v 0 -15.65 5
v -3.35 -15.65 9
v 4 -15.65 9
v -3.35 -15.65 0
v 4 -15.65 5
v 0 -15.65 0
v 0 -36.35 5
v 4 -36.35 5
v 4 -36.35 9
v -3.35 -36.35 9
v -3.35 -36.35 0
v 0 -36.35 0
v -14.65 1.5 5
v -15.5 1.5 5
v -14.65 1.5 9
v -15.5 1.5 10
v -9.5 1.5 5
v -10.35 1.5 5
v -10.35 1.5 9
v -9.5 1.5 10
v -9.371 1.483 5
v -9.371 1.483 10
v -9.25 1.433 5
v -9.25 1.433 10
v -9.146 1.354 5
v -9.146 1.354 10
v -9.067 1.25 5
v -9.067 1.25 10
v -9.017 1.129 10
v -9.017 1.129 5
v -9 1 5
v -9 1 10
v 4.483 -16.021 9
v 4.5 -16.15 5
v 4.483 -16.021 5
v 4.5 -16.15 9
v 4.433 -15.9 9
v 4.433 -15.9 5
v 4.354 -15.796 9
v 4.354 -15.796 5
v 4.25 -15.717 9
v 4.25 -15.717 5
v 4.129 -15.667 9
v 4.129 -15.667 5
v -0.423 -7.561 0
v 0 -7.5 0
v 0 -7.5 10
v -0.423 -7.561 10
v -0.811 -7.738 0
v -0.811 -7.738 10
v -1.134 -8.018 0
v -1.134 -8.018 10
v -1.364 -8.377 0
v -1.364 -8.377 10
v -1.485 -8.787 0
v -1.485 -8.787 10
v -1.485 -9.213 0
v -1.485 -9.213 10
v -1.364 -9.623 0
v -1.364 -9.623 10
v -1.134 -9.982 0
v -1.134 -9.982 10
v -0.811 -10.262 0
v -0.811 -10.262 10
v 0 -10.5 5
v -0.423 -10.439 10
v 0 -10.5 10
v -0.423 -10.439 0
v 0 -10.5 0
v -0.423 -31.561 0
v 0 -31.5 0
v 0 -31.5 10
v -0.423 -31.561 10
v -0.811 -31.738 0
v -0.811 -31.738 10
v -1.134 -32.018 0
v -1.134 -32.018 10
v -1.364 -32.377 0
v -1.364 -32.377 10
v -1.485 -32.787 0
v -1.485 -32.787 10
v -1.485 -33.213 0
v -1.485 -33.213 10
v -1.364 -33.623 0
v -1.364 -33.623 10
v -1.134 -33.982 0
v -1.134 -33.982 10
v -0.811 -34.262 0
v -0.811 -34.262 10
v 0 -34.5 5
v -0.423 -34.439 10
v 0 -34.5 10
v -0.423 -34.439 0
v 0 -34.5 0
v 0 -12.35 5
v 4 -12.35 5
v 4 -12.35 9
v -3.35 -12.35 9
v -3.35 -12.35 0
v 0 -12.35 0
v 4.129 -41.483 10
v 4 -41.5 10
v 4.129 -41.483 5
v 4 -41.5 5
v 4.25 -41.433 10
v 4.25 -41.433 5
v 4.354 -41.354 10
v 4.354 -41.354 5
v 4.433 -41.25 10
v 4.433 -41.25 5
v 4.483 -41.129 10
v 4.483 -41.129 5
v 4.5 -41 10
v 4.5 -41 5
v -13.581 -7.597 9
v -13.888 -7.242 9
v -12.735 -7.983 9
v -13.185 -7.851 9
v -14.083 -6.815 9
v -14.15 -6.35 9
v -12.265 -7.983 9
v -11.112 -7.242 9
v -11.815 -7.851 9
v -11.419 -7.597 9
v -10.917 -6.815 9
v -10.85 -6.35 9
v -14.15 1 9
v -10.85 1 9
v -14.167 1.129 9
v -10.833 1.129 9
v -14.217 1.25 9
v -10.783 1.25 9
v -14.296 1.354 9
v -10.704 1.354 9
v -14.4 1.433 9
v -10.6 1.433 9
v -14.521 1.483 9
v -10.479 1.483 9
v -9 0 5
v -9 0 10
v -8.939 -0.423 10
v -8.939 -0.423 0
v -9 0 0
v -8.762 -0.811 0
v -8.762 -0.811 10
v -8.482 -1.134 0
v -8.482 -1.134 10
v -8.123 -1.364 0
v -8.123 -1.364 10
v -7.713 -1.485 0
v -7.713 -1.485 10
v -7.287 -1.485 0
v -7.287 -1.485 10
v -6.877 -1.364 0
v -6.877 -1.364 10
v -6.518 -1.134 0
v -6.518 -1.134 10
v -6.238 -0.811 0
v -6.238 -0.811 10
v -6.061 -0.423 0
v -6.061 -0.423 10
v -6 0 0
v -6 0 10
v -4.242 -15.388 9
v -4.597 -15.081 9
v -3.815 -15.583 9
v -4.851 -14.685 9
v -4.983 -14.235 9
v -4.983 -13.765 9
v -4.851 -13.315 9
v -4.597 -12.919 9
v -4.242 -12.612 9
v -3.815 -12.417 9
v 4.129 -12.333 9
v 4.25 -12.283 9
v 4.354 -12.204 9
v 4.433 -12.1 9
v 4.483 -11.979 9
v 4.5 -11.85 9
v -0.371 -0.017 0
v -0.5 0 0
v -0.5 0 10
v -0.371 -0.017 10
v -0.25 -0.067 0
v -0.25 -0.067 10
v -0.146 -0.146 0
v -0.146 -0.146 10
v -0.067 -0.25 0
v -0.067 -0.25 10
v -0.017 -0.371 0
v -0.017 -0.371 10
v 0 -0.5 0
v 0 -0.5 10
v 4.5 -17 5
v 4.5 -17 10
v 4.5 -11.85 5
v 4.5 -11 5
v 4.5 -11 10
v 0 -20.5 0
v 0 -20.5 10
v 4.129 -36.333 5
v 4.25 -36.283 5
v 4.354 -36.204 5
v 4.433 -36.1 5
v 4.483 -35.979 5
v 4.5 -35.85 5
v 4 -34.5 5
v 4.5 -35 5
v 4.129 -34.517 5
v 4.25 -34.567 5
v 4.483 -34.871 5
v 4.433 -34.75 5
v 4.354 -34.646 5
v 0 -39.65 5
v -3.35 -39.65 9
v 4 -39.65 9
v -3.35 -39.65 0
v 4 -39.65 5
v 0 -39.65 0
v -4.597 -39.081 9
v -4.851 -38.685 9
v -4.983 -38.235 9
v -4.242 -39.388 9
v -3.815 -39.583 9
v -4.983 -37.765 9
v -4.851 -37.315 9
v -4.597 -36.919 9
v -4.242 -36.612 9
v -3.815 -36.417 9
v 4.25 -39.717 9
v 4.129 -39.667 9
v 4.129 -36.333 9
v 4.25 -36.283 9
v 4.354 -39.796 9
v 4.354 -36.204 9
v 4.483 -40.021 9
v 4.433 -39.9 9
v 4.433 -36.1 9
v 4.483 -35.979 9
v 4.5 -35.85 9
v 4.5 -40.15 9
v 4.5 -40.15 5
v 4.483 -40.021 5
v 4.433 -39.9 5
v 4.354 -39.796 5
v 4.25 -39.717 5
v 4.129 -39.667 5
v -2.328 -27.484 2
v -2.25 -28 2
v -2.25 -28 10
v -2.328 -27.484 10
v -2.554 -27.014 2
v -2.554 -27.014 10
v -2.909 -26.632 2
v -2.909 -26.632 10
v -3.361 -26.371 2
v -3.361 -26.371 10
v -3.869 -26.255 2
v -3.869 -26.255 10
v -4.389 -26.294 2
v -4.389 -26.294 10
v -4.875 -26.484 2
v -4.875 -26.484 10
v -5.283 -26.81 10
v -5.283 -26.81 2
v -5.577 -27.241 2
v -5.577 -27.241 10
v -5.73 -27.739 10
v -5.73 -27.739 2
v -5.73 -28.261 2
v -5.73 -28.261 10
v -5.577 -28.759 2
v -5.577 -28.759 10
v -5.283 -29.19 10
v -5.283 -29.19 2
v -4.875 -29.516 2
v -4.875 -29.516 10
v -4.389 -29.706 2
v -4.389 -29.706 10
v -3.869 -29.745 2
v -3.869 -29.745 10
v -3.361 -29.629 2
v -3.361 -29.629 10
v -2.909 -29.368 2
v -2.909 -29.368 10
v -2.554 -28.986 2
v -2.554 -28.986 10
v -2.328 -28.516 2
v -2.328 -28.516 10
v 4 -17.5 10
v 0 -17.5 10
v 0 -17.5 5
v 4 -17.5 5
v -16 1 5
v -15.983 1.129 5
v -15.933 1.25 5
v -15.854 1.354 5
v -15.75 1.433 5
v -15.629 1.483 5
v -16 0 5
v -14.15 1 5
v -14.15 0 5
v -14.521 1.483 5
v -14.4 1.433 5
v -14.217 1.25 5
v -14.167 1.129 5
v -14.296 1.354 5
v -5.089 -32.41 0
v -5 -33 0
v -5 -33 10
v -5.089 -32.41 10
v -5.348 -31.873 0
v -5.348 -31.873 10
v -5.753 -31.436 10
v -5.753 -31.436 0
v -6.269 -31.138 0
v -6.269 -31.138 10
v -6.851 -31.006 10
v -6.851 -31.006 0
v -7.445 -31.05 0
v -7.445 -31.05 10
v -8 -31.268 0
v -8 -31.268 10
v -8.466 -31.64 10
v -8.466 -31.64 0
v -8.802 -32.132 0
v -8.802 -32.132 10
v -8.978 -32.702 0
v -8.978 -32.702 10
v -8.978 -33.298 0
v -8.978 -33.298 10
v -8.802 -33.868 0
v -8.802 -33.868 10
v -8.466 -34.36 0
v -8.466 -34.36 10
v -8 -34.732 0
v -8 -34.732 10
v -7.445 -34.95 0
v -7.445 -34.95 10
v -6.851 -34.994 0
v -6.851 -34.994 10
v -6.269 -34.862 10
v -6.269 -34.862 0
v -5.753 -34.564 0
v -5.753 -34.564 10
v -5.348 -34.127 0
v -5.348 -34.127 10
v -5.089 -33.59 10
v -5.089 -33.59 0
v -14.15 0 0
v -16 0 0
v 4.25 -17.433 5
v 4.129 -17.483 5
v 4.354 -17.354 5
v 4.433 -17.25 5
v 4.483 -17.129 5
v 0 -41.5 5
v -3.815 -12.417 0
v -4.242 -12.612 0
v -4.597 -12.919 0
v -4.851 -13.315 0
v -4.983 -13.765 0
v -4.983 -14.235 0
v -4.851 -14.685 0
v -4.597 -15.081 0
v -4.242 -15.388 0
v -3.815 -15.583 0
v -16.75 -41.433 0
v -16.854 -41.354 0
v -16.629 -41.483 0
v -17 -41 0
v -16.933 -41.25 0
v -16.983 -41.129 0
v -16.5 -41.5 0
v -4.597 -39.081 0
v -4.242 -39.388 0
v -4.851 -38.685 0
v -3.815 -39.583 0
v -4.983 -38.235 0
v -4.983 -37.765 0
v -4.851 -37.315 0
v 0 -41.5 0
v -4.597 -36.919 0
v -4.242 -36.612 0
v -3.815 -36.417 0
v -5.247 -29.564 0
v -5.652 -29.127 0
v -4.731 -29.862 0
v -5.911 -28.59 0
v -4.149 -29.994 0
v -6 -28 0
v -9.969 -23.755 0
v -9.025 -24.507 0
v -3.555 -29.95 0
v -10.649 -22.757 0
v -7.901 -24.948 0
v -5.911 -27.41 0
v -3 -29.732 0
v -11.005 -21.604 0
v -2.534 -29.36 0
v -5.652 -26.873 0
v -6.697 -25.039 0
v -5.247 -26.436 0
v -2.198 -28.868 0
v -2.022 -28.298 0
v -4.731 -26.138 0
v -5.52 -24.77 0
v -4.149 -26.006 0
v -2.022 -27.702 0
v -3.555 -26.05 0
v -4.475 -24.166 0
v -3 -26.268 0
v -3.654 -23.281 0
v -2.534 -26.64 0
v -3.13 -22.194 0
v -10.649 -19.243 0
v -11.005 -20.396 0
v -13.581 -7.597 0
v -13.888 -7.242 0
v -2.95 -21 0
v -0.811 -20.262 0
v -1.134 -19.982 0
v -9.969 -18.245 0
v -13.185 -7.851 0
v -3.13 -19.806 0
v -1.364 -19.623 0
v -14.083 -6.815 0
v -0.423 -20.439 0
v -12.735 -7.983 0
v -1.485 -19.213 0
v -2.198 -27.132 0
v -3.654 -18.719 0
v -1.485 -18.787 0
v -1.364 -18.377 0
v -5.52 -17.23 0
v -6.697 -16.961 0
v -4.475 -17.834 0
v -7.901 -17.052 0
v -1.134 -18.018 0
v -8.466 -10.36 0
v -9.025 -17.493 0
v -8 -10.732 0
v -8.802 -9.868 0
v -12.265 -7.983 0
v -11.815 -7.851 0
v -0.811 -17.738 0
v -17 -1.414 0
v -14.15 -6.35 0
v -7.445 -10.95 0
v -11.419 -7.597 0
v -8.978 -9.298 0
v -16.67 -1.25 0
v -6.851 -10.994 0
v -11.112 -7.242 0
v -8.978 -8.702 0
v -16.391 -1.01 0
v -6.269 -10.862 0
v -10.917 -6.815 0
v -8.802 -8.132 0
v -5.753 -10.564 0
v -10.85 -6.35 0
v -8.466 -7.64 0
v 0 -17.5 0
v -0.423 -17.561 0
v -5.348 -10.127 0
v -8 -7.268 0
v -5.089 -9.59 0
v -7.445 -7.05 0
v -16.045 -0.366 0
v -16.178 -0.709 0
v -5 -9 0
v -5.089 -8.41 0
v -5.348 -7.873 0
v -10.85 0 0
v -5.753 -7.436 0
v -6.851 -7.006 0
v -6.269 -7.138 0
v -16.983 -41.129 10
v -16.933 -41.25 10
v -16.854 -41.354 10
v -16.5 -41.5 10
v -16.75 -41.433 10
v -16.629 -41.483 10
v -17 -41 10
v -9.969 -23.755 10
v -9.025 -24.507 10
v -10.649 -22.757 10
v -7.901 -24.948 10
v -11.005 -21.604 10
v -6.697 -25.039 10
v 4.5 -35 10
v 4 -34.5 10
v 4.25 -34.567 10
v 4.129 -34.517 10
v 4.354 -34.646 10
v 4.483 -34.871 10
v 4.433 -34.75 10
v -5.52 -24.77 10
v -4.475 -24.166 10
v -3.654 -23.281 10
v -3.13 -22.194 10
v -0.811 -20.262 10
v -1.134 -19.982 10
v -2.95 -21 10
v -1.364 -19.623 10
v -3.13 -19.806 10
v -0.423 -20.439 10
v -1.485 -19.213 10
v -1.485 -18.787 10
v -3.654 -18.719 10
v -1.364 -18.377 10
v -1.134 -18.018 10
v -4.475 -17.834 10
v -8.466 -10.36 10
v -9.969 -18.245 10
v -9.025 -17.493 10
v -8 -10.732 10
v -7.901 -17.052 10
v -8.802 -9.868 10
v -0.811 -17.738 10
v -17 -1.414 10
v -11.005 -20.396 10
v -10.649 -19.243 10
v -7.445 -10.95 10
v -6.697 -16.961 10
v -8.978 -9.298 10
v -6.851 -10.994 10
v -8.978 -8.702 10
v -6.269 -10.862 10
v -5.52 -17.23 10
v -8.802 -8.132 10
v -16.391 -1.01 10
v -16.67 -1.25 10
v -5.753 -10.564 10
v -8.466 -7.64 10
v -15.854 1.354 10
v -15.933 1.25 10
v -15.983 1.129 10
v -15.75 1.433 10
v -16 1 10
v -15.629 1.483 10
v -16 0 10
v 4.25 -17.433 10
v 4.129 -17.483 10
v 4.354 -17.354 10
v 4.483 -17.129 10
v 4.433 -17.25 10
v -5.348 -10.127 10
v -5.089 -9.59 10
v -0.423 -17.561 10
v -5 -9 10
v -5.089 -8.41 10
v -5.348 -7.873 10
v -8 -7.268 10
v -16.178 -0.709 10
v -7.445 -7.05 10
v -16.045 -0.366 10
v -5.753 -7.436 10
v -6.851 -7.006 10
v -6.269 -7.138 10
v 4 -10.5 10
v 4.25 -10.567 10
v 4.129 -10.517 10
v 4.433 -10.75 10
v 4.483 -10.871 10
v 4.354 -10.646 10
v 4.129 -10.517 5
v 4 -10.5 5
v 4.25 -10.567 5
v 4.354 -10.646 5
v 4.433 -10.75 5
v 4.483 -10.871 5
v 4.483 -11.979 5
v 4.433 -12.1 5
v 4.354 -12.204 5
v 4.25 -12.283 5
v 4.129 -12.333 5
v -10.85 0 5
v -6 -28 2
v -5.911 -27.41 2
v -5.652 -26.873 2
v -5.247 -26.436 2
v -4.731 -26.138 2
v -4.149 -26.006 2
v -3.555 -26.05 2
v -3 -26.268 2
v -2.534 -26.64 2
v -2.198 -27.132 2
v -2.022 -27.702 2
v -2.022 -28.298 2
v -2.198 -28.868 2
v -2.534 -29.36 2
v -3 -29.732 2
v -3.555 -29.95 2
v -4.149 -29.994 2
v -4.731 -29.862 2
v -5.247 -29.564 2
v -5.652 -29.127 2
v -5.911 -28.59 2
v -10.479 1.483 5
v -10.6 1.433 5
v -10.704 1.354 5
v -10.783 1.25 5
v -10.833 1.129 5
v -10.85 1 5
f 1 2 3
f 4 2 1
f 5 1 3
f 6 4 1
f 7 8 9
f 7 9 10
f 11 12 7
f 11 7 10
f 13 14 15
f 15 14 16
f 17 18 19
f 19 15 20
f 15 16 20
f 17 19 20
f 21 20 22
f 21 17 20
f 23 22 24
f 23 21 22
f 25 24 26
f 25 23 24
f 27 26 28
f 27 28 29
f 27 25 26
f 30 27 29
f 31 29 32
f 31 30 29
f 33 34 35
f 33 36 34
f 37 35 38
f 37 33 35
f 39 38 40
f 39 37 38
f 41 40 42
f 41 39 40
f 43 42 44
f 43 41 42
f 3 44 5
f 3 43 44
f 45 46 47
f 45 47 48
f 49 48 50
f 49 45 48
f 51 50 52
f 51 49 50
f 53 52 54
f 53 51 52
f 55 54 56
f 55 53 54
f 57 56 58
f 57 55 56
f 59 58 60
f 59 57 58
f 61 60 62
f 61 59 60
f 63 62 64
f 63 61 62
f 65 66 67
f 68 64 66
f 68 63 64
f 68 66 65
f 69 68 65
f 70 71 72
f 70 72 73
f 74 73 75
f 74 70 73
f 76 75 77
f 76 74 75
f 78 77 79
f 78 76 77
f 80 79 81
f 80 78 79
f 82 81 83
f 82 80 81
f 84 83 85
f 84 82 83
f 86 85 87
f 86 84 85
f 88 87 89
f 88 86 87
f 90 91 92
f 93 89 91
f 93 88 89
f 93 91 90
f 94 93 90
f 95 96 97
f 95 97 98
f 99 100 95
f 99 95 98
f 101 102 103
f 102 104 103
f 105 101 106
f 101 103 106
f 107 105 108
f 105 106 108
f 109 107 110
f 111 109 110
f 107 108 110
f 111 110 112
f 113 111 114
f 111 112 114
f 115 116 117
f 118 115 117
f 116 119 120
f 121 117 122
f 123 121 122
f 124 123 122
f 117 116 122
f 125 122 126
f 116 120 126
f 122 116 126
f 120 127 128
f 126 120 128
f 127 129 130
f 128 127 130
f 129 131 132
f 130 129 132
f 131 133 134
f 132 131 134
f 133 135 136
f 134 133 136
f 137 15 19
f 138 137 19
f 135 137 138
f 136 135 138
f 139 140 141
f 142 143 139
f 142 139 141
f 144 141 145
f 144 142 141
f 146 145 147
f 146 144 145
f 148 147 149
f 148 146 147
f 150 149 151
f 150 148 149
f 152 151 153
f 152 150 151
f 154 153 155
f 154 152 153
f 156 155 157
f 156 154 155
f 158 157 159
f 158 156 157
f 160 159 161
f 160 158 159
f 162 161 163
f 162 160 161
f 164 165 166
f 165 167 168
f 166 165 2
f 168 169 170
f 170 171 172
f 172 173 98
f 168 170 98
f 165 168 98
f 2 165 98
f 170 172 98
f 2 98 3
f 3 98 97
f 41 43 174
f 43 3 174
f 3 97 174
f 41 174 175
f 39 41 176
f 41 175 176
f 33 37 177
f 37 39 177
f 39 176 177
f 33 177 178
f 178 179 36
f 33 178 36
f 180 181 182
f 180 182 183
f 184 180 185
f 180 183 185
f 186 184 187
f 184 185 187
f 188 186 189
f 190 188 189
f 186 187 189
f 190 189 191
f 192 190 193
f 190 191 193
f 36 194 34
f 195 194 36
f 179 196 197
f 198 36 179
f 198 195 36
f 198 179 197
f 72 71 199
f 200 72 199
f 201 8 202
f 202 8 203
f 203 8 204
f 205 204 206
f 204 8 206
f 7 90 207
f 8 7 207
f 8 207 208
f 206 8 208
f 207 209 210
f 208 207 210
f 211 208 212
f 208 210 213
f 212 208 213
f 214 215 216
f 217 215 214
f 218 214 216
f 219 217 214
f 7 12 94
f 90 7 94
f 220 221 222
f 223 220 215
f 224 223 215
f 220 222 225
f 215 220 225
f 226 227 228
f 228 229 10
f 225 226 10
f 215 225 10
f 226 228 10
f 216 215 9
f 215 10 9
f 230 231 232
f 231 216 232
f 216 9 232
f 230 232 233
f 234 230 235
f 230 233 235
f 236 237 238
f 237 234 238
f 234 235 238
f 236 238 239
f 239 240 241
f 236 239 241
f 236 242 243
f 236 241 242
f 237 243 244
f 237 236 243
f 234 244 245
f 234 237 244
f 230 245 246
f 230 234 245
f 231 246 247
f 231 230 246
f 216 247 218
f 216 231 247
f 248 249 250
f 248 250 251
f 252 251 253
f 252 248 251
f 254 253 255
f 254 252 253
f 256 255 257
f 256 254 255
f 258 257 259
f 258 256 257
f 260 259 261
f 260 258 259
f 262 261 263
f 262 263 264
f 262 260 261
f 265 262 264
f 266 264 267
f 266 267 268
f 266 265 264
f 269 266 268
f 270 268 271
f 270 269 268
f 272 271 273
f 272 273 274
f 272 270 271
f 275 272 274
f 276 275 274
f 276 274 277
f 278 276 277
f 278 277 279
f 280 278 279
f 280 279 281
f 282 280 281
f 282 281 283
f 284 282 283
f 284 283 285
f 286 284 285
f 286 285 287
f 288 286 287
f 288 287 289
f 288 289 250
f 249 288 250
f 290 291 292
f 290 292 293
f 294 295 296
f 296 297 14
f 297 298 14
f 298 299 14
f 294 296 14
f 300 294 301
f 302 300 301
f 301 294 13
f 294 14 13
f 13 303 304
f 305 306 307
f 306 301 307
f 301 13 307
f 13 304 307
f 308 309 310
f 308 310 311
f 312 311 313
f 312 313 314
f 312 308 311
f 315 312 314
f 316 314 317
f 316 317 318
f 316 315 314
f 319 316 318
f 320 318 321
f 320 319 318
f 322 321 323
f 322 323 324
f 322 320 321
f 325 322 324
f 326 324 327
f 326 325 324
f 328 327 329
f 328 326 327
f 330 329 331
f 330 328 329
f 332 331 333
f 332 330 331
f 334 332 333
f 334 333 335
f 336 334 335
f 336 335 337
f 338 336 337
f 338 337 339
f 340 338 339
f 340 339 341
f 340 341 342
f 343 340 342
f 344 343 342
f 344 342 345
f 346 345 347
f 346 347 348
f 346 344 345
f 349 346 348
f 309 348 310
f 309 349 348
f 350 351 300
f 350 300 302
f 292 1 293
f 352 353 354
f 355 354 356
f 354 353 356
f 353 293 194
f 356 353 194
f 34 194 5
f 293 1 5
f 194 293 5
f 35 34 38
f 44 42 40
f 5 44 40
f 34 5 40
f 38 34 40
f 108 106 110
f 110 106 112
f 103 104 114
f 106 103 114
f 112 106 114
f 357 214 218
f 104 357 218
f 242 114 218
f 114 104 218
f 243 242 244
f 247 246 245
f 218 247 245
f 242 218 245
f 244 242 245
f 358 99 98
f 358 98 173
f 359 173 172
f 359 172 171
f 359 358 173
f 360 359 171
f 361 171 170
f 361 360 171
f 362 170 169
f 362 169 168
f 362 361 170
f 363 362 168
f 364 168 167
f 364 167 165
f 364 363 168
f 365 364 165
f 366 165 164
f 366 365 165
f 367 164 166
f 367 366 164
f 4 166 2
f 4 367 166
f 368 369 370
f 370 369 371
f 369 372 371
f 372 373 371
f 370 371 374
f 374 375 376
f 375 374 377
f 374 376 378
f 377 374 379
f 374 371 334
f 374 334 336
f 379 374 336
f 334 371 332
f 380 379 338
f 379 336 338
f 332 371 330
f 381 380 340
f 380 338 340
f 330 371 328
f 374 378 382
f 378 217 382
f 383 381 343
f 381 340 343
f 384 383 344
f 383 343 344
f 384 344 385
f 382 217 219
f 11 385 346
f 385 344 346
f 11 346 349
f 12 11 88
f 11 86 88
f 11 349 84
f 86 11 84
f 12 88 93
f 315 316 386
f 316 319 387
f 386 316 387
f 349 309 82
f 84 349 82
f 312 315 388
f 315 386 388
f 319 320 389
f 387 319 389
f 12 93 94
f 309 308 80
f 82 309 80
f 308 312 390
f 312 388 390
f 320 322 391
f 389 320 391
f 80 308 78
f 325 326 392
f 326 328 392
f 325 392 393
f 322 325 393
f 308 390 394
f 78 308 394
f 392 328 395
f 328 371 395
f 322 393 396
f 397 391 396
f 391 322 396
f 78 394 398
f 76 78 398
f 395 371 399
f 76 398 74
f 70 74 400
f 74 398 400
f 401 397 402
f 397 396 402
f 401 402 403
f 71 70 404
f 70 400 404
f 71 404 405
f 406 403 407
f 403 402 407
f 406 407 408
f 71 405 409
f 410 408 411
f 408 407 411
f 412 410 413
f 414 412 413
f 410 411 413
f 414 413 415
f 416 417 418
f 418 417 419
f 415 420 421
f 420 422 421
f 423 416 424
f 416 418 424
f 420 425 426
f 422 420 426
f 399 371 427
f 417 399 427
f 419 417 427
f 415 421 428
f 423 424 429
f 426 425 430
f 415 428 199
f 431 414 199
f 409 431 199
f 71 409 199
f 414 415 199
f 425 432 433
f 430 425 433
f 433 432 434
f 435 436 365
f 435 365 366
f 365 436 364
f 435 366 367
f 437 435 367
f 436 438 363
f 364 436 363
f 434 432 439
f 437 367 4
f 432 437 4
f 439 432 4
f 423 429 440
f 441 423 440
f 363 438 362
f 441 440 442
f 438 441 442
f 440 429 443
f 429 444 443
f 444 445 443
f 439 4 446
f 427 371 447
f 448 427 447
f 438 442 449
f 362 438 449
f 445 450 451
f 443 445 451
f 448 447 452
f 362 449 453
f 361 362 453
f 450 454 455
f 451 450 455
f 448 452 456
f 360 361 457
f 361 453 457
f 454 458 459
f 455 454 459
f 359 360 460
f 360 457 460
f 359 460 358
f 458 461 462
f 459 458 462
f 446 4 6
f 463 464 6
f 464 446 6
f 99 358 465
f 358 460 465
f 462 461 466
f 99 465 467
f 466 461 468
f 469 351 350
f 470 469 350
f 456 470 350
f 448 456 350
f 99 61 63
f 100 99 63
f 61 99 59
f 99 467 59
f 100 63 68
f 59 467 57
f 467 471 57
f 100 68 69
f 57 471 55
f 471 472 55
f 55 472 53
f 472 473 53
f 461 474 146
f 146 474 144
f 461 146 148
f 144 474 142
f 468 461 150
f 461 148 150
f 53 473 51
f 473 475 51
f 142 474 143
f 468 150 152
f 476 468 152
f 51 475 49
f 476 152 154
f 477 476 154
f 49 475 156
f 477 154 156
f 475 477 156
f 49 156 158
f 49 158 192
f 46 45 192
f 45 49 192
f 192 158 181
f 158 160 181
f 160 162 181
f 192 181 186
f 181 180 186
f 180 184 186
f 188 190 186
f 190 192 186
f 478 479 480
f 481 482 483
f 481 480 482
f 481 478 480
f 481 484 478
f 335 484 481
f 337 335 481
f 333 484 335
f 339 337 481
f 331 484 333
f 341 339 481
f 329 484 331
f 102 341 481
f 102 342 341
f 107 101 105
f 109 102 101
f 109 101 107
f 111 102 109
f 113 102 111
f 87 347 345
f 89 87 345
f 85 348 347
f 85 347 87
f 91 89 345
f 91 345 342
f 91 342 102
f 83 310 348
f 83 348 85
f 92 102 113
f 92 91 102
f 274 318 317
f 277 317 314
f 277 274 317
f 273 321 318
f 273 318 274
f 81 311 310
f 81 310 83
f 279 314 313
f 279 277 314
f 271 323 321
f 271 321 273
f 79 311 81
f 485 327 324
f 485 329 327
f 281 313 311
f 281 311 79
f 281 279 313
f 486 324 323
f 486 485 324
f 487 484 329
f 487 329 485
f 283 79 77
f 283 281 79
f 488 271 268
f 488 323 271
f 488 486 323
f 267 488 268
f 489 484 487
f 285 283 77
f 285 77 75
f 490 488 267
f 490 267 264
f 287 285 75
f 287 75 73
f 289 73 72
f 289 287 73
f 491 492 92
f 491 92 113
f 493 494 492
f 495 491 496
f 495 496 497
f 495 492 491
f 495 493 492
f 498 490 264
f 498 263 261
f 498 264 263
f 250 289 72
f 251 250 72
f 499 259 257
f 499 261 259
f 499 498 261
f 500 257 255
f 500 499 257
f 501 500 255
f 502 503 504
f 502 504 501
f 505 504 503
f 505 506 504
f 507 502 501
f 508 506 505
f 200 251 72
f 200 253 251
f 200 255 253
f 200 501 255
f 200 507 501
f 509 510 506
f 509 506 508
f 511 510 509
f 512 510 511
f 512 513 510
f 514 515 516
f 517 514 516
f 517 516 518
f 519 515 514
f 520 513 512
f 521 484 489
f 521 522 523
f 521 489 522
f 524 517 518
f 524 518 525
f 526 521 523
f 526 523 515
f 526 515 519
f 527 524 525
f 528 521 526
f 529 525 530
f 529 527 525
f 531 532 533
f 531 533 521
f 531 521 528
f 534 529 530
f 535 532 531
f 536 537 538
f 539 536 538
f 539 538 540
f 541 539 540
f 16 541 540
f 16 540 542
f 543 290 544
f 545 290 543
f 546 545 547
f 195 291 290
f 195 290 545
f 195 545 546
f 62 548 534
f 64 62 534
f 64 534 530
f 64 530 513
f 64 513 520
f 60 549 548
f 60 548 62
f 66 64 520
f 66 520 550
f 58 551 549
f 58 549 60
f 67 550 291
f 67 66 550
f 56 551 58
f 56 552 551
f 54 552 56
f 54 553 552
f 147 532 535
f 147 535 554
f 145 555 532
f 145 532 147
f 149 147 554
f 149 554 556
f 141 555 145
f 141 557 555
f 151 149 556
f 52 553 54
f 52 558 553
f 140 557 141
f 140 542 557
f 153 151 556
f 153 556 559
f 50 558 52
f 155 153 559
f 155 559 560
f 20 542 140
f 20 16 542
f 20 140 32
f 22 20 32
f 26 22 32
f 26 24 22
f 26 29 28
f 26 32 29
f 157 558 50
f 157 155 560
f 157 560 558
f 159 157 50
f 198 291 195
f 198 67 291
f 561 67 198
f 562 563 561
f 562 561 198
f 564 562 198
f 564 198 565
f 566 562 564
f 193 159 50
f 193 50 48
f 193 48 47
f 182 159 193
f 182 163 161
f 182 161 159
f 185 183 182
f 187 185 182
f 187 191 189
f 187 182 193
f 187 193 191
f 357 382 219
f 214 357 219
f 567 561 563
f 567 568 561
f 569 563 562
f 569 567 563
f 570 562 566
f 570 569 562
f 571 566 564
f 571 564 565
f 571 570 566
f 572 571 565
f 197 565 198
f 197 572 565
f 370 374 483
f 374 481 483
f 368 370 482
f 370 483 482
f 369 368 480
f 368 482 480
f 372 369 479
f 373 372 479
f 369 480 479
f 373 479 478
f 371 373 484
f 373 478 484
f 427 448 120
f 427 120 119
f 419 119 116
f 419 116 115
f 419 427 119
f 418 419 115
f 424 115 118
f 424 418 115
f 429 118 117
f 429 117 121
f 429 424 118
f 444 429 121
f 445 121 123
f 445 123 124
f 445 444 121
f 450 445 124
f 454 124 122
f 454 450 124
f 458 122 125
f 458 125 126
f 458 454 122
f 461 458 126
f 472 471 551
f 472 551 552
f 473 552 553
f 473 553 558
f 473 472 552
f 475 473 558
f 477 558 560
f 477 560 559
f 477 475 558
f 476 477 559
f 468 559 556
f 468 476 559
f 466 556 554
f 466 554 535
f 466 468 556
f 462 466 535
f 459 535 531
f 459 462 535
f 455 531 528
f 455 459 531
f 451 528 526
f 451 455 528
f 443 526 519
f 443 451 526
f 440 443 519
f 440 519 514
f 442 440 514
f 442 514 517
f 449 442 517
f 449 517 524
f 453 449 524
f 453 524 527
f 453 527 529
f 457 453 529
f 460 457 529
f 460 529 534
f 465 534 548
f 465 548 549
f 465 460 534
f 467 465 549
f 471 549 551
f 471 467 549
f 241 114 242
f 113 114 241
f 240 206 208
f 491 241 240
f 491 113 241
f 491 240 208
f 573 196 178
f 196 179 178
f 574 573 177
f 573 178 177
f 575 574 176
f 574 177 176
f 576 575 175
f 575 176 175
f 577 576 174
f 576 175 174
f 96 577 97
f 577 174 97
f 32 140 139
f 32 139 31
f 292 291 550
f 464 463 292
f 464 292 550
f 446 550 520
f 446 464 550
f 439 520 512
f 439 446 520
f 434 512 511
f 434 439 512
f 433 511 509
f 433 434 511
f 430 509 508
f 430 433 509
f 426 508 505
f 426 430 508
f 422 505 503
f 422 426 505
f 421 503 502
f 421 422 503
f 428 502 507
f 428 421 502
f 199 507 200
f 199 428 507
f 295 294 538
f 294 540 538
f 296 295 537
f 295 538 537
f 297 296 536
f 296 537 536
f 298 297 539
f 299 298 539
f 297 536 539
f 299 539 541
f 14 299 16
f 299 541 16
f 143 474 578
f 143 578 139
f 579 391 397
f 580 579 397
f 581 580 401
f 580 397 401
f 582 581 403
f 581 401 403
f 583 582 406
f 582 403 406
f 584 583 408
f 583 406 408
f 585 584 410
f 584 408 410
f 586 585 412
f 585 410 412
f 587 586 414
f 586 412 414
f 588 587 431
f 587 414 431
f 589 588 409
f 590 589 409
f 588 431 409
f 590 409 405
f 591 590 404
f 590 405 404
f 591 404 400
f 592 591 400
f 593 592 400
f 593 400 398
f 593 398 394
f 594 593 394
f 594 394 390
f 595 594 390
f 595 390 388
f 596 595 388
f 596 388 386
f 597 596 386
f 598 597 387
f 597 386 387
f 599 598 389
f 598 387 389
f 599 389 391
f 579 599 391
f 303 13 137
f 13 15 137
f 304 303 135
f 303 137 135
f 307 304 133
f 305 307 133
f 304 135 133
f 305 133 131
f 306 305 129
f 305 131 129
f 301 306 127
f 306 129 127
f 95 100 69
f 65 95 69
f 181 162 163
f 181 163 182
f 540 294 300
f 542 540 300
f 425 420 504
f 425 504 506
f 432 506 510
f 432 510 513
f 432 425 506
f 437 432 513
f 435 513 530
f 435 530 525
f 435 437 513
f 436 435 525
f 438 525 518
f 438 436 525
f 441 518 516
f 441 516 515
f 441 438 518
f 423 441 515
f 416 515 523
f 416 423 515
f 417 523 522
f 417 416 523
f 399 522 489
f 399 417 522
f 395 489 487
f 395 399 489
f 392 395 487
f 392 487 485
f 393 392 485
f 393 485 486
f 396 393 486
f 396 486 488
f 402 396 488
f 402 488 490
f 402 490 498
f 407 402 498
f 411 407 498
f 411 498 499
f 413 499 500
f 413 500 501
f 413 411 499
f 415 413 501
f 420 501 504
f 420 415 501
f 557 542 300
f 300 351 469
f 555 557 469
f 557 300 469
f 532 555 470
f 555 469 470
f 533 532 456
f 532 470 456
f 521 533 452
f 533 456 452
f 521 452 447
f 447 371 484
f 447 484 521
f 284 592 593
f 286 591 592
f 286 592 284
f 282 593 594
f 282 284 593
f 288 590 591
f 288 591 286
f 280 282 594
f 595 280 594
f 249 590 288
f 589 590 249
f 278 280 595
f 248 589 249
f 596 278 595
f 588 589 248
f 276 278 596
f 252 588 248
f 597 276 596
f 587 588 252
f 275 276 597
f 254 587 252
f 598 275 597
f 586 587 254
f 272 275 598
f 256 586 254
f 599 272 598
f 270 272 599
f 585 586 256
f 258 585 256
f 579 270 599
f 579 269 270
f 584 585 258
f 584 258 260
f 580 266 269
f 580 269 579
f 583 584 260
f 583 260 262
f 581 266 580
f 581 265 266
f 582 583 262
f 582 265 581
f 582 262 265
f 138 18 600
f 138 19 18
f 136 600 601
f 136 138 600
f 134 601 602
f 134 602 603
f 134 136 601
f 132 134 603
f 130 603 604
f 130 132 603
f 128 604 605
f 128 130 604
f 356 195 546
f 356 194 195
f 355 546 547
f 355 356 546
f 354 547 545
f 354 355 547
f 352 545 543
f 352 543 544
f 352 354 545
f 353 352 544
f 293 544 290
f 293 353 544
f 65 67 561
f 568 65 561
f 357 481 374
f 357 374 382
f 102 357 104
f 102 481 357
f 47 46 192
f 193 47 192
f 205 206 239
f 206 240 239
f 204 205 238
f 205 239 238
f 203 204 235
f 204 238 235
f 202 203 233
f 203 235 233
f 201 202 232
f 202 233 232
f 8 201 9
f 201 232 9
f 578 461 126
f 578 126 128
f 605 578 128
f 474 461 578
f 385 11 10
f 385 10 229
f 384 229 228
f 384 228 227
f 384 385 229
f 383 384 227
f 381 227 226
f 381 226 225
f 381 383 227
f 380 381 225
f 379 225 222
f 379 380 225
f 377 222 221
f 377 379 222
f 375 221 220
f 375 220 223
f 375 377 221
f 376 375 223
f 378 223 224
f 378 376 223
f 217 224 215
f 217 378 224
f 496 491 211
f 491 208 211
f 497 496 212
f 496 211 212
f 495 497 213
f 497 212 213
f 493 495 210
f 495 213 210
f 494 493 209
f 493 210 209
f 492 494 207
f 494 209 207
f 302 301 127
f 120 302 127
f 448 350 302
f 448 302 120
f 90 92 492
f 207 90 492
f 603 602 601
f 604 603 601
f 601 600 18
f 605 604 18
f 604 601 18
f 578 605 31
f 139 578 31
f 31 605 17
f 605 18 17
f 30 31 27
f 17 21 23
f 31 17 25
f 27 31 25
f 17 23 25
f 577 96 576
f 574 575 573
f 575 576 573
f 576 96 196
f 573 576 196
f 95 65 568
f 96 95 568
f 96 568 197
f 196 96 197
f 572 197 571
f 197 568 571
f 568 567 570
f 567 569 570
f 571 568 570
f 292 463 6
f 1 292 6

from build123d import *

# Parameters (mm, degrees)
SKETCH12_W          = 17
SKETCH12_H          = 41.5
SKETCH12_R          = 2
SKETCH12_R_2        = 4.05
SKETCH12_R_3        = 1.75
BOSS_EXTRUDE3_DEPTH = 10
SKETCH18_W          = 4.5
SKETCH18_H          = 7
SKETCH18_W_2        = 8
SKETCH18_H_2        = 1.5
BOSS_EXTRUDE4_DEPTH = 5
SKETCH23_R          = 2
CUT_EXTRUDE12_DEPTH = 2
CUT_EXTRUDE13_DEPTH = 46.948340558
CUT_EXTRUDE14_DEPTH = 9
FILLET4_R           = 0.5


with BuildPart() as part:
    # Sketch12 → Boss-Extrude3 (new body)
    with BuildSketch(Plane.XY):
        with Locations((-8.5, -20.75)):
            Rectangle(SKETCH12_W, SKETCH12_H)
        with Locations((-7, -9)):
            Circle(SKETCH12_R, mode=Mode.SUBTRACT)
        with Locations((-7, -21)):
            Circle(SKETCH12_R_2, mode=Mode.SUBTRACT)
        with Locations((-7, -33)):
            Circle(SKETCH12_R, mode=Mode.SUBTRACT)
        with Locations((-4, -28)):
            Circle(SKETCH12_R_3, mode=Mode.SUBTRACT)
    extrude(amount=BOSS_EXTRUDE3_DEPTH)

    # Sketch18 → Boss-Extrude4 (add)
    with BuildSketch(Plane.XY.offset(10)):
        with Locations((2.25, -14)):
            Rectangle(SKETCH18_W, SKETCH18_H)
        with Locations((2.25, -38)):
            Rectangle(SKETCH18_W, SKETCH18_H)
        with Locations((-13, 0.75)):
            Rectangle(SKETCH18_W_2, SKETCH18_H_2)
    extrude(amount=-BOSS_EXTRUDE4_DEPTH)

    # Sketch23 → Cut-Extrude12 (cut)
    with BuildSketch(Plane(origin=(0, 0, 0), x_dir=(-1, 0, 0), z_dir=(0, 0, -1))):
        with Locations((4, -28)):
            Circle(SKETCH23_R)
    extrude(amount=-CUT_EXTRUDE12_DEPTH, mode=Mode.SUBTRACT)

    # Sketch24 → Cut-Extrude13 (cut, through all)
    with BuildSketch(Plane(origin=(0, 0, 0), x_dir=(-1, 0, 0), z_dir=(0, 0, -1))):
        with BuildLine():
            Line((0, -34.5), (-4.5, -34.5))
            ThreePointArc((-4.5, -34.5), (-6, -33), (-4.5, -31.5))
            Line((-4.5, -31.5), (0, -31.5))
            ThreePointArc((0, -31.5), (1.5, -33), (0, -34.5))
        make_face()
        with BuildLine():
            Line((0, -20.5), (-4.5, -20.5))
            ThreePointArc((-4.5, -20.5), (-6, -19), (-4.5, -17.5))
            Line((-4.5, -17.5), (0, -17.5))
            ThreePointArc((0, -17.5), (1.5, -19), (0, -20.5))
        make_face()
        with BuildLine():
            Line((-4.5, -7.5), (0, -7.5))
            ThreePointArc((0, -7.5), (1.5, -9), (0, -10.5))
            Line((0, -10.5), (-4.5, -10.5))
            ThreePointArc((-4.5, -10.5), (-6, -9), (-4.5, -7.5))
        make_face()
        with BuildLine():
            Line((6, 0), (6, 1.5))
            ThreePointArc((6, 1.5), (7.5, 3), (9, 1.5))
            Line((9, 1.5), (9, 0))
            ThreePointArc((9, 0), (7.5, -1.5), (6, 0))
        make_face()
        with BuildLine():
            Line((19, 0), (19, 1.5))
            ThreePointArc((19, 1.5), (17.5, 3), (16, 1.5))
            Line((16, 1.5), (16, 0))
            ThreePointArc((16, 0), (17.5, -1.5), (19, 0))
        make_face()
    extrude(amount=-CUT_EXTRUDE13_DEPTH, mode=Mode.SUBTRACT)

    # Sketch25 → Cut-Extrude14 (cut)
    with BuildSketch(Plane(origin=(0, 0, 0), x_dir=(-1, 0, 0), z_dir=(0, 0, -1))):
        with BuildLine():
            Line((14.15, 1.5), (14.15, -6.35))
            ThreePointArc((14.15, -6.35), (12.5, -8), (10.85, -6.35))
            Line((10.85, -6.35), (10.85, 1.5))
            ThreePointArc((10.85, 1.5), (12.5, 3.15), (14.15, 1.5))
        make_face()
        with BuildLine():
            Line((-4.5, -12.35), (3.35, -12.35))
            ThreePointArc((3.35, -12.35), (5, -14), (3.35, -15.65))
            Line((3.35, -15.65), (-4.5, -15.65))
            ThreePointArc((-4.5, -15.65), (-6.15, -14), (-4.5, -12.35))
        make_face()
        with BuildLine():
            Line((-4.5, -36.35), (3.35, -36.35))
            ThreePointArc((3.35, -36.35), (5, -38), (3.35, -39.65))
            Line((3.35, -39.65), (-4.5, -39.65))
            ThreePointArc((-4.5, -39.65), (-6.15, -38), (-4.5, -36.35))
        make_face()
    extrude(amount=-CUT_EXTRUDE14_DEPTH, mode=Mode.SUBTRACT)

    # Fillet4
    fillet4_edges = [part.edges().sort_by_distance(p)[0] for p in [
        (4.5, -41.5, 7.5),
        (4.5, -10.5, 7.5),
        (4.5, -34.5, 7.5),
        (4.5, -17.5, 7.5),
        (-17, -41.5, 5),
        (0, 0, 5),
        (-9, 1.5, 7.5),
        (-16, 1.5, 7.5),
        (-14.15, 1.5, 7),
        (-10.85, 1.5, 7),
        (4.5, -36.35, 7),
        (4.5, -39.65, 7),
        (4.5, -15.65, 7),
        (4.5, -12.35, 7),
    ]]
    fillet(fillet4_edges, radius=FILLET4_R)


solid = part.part
